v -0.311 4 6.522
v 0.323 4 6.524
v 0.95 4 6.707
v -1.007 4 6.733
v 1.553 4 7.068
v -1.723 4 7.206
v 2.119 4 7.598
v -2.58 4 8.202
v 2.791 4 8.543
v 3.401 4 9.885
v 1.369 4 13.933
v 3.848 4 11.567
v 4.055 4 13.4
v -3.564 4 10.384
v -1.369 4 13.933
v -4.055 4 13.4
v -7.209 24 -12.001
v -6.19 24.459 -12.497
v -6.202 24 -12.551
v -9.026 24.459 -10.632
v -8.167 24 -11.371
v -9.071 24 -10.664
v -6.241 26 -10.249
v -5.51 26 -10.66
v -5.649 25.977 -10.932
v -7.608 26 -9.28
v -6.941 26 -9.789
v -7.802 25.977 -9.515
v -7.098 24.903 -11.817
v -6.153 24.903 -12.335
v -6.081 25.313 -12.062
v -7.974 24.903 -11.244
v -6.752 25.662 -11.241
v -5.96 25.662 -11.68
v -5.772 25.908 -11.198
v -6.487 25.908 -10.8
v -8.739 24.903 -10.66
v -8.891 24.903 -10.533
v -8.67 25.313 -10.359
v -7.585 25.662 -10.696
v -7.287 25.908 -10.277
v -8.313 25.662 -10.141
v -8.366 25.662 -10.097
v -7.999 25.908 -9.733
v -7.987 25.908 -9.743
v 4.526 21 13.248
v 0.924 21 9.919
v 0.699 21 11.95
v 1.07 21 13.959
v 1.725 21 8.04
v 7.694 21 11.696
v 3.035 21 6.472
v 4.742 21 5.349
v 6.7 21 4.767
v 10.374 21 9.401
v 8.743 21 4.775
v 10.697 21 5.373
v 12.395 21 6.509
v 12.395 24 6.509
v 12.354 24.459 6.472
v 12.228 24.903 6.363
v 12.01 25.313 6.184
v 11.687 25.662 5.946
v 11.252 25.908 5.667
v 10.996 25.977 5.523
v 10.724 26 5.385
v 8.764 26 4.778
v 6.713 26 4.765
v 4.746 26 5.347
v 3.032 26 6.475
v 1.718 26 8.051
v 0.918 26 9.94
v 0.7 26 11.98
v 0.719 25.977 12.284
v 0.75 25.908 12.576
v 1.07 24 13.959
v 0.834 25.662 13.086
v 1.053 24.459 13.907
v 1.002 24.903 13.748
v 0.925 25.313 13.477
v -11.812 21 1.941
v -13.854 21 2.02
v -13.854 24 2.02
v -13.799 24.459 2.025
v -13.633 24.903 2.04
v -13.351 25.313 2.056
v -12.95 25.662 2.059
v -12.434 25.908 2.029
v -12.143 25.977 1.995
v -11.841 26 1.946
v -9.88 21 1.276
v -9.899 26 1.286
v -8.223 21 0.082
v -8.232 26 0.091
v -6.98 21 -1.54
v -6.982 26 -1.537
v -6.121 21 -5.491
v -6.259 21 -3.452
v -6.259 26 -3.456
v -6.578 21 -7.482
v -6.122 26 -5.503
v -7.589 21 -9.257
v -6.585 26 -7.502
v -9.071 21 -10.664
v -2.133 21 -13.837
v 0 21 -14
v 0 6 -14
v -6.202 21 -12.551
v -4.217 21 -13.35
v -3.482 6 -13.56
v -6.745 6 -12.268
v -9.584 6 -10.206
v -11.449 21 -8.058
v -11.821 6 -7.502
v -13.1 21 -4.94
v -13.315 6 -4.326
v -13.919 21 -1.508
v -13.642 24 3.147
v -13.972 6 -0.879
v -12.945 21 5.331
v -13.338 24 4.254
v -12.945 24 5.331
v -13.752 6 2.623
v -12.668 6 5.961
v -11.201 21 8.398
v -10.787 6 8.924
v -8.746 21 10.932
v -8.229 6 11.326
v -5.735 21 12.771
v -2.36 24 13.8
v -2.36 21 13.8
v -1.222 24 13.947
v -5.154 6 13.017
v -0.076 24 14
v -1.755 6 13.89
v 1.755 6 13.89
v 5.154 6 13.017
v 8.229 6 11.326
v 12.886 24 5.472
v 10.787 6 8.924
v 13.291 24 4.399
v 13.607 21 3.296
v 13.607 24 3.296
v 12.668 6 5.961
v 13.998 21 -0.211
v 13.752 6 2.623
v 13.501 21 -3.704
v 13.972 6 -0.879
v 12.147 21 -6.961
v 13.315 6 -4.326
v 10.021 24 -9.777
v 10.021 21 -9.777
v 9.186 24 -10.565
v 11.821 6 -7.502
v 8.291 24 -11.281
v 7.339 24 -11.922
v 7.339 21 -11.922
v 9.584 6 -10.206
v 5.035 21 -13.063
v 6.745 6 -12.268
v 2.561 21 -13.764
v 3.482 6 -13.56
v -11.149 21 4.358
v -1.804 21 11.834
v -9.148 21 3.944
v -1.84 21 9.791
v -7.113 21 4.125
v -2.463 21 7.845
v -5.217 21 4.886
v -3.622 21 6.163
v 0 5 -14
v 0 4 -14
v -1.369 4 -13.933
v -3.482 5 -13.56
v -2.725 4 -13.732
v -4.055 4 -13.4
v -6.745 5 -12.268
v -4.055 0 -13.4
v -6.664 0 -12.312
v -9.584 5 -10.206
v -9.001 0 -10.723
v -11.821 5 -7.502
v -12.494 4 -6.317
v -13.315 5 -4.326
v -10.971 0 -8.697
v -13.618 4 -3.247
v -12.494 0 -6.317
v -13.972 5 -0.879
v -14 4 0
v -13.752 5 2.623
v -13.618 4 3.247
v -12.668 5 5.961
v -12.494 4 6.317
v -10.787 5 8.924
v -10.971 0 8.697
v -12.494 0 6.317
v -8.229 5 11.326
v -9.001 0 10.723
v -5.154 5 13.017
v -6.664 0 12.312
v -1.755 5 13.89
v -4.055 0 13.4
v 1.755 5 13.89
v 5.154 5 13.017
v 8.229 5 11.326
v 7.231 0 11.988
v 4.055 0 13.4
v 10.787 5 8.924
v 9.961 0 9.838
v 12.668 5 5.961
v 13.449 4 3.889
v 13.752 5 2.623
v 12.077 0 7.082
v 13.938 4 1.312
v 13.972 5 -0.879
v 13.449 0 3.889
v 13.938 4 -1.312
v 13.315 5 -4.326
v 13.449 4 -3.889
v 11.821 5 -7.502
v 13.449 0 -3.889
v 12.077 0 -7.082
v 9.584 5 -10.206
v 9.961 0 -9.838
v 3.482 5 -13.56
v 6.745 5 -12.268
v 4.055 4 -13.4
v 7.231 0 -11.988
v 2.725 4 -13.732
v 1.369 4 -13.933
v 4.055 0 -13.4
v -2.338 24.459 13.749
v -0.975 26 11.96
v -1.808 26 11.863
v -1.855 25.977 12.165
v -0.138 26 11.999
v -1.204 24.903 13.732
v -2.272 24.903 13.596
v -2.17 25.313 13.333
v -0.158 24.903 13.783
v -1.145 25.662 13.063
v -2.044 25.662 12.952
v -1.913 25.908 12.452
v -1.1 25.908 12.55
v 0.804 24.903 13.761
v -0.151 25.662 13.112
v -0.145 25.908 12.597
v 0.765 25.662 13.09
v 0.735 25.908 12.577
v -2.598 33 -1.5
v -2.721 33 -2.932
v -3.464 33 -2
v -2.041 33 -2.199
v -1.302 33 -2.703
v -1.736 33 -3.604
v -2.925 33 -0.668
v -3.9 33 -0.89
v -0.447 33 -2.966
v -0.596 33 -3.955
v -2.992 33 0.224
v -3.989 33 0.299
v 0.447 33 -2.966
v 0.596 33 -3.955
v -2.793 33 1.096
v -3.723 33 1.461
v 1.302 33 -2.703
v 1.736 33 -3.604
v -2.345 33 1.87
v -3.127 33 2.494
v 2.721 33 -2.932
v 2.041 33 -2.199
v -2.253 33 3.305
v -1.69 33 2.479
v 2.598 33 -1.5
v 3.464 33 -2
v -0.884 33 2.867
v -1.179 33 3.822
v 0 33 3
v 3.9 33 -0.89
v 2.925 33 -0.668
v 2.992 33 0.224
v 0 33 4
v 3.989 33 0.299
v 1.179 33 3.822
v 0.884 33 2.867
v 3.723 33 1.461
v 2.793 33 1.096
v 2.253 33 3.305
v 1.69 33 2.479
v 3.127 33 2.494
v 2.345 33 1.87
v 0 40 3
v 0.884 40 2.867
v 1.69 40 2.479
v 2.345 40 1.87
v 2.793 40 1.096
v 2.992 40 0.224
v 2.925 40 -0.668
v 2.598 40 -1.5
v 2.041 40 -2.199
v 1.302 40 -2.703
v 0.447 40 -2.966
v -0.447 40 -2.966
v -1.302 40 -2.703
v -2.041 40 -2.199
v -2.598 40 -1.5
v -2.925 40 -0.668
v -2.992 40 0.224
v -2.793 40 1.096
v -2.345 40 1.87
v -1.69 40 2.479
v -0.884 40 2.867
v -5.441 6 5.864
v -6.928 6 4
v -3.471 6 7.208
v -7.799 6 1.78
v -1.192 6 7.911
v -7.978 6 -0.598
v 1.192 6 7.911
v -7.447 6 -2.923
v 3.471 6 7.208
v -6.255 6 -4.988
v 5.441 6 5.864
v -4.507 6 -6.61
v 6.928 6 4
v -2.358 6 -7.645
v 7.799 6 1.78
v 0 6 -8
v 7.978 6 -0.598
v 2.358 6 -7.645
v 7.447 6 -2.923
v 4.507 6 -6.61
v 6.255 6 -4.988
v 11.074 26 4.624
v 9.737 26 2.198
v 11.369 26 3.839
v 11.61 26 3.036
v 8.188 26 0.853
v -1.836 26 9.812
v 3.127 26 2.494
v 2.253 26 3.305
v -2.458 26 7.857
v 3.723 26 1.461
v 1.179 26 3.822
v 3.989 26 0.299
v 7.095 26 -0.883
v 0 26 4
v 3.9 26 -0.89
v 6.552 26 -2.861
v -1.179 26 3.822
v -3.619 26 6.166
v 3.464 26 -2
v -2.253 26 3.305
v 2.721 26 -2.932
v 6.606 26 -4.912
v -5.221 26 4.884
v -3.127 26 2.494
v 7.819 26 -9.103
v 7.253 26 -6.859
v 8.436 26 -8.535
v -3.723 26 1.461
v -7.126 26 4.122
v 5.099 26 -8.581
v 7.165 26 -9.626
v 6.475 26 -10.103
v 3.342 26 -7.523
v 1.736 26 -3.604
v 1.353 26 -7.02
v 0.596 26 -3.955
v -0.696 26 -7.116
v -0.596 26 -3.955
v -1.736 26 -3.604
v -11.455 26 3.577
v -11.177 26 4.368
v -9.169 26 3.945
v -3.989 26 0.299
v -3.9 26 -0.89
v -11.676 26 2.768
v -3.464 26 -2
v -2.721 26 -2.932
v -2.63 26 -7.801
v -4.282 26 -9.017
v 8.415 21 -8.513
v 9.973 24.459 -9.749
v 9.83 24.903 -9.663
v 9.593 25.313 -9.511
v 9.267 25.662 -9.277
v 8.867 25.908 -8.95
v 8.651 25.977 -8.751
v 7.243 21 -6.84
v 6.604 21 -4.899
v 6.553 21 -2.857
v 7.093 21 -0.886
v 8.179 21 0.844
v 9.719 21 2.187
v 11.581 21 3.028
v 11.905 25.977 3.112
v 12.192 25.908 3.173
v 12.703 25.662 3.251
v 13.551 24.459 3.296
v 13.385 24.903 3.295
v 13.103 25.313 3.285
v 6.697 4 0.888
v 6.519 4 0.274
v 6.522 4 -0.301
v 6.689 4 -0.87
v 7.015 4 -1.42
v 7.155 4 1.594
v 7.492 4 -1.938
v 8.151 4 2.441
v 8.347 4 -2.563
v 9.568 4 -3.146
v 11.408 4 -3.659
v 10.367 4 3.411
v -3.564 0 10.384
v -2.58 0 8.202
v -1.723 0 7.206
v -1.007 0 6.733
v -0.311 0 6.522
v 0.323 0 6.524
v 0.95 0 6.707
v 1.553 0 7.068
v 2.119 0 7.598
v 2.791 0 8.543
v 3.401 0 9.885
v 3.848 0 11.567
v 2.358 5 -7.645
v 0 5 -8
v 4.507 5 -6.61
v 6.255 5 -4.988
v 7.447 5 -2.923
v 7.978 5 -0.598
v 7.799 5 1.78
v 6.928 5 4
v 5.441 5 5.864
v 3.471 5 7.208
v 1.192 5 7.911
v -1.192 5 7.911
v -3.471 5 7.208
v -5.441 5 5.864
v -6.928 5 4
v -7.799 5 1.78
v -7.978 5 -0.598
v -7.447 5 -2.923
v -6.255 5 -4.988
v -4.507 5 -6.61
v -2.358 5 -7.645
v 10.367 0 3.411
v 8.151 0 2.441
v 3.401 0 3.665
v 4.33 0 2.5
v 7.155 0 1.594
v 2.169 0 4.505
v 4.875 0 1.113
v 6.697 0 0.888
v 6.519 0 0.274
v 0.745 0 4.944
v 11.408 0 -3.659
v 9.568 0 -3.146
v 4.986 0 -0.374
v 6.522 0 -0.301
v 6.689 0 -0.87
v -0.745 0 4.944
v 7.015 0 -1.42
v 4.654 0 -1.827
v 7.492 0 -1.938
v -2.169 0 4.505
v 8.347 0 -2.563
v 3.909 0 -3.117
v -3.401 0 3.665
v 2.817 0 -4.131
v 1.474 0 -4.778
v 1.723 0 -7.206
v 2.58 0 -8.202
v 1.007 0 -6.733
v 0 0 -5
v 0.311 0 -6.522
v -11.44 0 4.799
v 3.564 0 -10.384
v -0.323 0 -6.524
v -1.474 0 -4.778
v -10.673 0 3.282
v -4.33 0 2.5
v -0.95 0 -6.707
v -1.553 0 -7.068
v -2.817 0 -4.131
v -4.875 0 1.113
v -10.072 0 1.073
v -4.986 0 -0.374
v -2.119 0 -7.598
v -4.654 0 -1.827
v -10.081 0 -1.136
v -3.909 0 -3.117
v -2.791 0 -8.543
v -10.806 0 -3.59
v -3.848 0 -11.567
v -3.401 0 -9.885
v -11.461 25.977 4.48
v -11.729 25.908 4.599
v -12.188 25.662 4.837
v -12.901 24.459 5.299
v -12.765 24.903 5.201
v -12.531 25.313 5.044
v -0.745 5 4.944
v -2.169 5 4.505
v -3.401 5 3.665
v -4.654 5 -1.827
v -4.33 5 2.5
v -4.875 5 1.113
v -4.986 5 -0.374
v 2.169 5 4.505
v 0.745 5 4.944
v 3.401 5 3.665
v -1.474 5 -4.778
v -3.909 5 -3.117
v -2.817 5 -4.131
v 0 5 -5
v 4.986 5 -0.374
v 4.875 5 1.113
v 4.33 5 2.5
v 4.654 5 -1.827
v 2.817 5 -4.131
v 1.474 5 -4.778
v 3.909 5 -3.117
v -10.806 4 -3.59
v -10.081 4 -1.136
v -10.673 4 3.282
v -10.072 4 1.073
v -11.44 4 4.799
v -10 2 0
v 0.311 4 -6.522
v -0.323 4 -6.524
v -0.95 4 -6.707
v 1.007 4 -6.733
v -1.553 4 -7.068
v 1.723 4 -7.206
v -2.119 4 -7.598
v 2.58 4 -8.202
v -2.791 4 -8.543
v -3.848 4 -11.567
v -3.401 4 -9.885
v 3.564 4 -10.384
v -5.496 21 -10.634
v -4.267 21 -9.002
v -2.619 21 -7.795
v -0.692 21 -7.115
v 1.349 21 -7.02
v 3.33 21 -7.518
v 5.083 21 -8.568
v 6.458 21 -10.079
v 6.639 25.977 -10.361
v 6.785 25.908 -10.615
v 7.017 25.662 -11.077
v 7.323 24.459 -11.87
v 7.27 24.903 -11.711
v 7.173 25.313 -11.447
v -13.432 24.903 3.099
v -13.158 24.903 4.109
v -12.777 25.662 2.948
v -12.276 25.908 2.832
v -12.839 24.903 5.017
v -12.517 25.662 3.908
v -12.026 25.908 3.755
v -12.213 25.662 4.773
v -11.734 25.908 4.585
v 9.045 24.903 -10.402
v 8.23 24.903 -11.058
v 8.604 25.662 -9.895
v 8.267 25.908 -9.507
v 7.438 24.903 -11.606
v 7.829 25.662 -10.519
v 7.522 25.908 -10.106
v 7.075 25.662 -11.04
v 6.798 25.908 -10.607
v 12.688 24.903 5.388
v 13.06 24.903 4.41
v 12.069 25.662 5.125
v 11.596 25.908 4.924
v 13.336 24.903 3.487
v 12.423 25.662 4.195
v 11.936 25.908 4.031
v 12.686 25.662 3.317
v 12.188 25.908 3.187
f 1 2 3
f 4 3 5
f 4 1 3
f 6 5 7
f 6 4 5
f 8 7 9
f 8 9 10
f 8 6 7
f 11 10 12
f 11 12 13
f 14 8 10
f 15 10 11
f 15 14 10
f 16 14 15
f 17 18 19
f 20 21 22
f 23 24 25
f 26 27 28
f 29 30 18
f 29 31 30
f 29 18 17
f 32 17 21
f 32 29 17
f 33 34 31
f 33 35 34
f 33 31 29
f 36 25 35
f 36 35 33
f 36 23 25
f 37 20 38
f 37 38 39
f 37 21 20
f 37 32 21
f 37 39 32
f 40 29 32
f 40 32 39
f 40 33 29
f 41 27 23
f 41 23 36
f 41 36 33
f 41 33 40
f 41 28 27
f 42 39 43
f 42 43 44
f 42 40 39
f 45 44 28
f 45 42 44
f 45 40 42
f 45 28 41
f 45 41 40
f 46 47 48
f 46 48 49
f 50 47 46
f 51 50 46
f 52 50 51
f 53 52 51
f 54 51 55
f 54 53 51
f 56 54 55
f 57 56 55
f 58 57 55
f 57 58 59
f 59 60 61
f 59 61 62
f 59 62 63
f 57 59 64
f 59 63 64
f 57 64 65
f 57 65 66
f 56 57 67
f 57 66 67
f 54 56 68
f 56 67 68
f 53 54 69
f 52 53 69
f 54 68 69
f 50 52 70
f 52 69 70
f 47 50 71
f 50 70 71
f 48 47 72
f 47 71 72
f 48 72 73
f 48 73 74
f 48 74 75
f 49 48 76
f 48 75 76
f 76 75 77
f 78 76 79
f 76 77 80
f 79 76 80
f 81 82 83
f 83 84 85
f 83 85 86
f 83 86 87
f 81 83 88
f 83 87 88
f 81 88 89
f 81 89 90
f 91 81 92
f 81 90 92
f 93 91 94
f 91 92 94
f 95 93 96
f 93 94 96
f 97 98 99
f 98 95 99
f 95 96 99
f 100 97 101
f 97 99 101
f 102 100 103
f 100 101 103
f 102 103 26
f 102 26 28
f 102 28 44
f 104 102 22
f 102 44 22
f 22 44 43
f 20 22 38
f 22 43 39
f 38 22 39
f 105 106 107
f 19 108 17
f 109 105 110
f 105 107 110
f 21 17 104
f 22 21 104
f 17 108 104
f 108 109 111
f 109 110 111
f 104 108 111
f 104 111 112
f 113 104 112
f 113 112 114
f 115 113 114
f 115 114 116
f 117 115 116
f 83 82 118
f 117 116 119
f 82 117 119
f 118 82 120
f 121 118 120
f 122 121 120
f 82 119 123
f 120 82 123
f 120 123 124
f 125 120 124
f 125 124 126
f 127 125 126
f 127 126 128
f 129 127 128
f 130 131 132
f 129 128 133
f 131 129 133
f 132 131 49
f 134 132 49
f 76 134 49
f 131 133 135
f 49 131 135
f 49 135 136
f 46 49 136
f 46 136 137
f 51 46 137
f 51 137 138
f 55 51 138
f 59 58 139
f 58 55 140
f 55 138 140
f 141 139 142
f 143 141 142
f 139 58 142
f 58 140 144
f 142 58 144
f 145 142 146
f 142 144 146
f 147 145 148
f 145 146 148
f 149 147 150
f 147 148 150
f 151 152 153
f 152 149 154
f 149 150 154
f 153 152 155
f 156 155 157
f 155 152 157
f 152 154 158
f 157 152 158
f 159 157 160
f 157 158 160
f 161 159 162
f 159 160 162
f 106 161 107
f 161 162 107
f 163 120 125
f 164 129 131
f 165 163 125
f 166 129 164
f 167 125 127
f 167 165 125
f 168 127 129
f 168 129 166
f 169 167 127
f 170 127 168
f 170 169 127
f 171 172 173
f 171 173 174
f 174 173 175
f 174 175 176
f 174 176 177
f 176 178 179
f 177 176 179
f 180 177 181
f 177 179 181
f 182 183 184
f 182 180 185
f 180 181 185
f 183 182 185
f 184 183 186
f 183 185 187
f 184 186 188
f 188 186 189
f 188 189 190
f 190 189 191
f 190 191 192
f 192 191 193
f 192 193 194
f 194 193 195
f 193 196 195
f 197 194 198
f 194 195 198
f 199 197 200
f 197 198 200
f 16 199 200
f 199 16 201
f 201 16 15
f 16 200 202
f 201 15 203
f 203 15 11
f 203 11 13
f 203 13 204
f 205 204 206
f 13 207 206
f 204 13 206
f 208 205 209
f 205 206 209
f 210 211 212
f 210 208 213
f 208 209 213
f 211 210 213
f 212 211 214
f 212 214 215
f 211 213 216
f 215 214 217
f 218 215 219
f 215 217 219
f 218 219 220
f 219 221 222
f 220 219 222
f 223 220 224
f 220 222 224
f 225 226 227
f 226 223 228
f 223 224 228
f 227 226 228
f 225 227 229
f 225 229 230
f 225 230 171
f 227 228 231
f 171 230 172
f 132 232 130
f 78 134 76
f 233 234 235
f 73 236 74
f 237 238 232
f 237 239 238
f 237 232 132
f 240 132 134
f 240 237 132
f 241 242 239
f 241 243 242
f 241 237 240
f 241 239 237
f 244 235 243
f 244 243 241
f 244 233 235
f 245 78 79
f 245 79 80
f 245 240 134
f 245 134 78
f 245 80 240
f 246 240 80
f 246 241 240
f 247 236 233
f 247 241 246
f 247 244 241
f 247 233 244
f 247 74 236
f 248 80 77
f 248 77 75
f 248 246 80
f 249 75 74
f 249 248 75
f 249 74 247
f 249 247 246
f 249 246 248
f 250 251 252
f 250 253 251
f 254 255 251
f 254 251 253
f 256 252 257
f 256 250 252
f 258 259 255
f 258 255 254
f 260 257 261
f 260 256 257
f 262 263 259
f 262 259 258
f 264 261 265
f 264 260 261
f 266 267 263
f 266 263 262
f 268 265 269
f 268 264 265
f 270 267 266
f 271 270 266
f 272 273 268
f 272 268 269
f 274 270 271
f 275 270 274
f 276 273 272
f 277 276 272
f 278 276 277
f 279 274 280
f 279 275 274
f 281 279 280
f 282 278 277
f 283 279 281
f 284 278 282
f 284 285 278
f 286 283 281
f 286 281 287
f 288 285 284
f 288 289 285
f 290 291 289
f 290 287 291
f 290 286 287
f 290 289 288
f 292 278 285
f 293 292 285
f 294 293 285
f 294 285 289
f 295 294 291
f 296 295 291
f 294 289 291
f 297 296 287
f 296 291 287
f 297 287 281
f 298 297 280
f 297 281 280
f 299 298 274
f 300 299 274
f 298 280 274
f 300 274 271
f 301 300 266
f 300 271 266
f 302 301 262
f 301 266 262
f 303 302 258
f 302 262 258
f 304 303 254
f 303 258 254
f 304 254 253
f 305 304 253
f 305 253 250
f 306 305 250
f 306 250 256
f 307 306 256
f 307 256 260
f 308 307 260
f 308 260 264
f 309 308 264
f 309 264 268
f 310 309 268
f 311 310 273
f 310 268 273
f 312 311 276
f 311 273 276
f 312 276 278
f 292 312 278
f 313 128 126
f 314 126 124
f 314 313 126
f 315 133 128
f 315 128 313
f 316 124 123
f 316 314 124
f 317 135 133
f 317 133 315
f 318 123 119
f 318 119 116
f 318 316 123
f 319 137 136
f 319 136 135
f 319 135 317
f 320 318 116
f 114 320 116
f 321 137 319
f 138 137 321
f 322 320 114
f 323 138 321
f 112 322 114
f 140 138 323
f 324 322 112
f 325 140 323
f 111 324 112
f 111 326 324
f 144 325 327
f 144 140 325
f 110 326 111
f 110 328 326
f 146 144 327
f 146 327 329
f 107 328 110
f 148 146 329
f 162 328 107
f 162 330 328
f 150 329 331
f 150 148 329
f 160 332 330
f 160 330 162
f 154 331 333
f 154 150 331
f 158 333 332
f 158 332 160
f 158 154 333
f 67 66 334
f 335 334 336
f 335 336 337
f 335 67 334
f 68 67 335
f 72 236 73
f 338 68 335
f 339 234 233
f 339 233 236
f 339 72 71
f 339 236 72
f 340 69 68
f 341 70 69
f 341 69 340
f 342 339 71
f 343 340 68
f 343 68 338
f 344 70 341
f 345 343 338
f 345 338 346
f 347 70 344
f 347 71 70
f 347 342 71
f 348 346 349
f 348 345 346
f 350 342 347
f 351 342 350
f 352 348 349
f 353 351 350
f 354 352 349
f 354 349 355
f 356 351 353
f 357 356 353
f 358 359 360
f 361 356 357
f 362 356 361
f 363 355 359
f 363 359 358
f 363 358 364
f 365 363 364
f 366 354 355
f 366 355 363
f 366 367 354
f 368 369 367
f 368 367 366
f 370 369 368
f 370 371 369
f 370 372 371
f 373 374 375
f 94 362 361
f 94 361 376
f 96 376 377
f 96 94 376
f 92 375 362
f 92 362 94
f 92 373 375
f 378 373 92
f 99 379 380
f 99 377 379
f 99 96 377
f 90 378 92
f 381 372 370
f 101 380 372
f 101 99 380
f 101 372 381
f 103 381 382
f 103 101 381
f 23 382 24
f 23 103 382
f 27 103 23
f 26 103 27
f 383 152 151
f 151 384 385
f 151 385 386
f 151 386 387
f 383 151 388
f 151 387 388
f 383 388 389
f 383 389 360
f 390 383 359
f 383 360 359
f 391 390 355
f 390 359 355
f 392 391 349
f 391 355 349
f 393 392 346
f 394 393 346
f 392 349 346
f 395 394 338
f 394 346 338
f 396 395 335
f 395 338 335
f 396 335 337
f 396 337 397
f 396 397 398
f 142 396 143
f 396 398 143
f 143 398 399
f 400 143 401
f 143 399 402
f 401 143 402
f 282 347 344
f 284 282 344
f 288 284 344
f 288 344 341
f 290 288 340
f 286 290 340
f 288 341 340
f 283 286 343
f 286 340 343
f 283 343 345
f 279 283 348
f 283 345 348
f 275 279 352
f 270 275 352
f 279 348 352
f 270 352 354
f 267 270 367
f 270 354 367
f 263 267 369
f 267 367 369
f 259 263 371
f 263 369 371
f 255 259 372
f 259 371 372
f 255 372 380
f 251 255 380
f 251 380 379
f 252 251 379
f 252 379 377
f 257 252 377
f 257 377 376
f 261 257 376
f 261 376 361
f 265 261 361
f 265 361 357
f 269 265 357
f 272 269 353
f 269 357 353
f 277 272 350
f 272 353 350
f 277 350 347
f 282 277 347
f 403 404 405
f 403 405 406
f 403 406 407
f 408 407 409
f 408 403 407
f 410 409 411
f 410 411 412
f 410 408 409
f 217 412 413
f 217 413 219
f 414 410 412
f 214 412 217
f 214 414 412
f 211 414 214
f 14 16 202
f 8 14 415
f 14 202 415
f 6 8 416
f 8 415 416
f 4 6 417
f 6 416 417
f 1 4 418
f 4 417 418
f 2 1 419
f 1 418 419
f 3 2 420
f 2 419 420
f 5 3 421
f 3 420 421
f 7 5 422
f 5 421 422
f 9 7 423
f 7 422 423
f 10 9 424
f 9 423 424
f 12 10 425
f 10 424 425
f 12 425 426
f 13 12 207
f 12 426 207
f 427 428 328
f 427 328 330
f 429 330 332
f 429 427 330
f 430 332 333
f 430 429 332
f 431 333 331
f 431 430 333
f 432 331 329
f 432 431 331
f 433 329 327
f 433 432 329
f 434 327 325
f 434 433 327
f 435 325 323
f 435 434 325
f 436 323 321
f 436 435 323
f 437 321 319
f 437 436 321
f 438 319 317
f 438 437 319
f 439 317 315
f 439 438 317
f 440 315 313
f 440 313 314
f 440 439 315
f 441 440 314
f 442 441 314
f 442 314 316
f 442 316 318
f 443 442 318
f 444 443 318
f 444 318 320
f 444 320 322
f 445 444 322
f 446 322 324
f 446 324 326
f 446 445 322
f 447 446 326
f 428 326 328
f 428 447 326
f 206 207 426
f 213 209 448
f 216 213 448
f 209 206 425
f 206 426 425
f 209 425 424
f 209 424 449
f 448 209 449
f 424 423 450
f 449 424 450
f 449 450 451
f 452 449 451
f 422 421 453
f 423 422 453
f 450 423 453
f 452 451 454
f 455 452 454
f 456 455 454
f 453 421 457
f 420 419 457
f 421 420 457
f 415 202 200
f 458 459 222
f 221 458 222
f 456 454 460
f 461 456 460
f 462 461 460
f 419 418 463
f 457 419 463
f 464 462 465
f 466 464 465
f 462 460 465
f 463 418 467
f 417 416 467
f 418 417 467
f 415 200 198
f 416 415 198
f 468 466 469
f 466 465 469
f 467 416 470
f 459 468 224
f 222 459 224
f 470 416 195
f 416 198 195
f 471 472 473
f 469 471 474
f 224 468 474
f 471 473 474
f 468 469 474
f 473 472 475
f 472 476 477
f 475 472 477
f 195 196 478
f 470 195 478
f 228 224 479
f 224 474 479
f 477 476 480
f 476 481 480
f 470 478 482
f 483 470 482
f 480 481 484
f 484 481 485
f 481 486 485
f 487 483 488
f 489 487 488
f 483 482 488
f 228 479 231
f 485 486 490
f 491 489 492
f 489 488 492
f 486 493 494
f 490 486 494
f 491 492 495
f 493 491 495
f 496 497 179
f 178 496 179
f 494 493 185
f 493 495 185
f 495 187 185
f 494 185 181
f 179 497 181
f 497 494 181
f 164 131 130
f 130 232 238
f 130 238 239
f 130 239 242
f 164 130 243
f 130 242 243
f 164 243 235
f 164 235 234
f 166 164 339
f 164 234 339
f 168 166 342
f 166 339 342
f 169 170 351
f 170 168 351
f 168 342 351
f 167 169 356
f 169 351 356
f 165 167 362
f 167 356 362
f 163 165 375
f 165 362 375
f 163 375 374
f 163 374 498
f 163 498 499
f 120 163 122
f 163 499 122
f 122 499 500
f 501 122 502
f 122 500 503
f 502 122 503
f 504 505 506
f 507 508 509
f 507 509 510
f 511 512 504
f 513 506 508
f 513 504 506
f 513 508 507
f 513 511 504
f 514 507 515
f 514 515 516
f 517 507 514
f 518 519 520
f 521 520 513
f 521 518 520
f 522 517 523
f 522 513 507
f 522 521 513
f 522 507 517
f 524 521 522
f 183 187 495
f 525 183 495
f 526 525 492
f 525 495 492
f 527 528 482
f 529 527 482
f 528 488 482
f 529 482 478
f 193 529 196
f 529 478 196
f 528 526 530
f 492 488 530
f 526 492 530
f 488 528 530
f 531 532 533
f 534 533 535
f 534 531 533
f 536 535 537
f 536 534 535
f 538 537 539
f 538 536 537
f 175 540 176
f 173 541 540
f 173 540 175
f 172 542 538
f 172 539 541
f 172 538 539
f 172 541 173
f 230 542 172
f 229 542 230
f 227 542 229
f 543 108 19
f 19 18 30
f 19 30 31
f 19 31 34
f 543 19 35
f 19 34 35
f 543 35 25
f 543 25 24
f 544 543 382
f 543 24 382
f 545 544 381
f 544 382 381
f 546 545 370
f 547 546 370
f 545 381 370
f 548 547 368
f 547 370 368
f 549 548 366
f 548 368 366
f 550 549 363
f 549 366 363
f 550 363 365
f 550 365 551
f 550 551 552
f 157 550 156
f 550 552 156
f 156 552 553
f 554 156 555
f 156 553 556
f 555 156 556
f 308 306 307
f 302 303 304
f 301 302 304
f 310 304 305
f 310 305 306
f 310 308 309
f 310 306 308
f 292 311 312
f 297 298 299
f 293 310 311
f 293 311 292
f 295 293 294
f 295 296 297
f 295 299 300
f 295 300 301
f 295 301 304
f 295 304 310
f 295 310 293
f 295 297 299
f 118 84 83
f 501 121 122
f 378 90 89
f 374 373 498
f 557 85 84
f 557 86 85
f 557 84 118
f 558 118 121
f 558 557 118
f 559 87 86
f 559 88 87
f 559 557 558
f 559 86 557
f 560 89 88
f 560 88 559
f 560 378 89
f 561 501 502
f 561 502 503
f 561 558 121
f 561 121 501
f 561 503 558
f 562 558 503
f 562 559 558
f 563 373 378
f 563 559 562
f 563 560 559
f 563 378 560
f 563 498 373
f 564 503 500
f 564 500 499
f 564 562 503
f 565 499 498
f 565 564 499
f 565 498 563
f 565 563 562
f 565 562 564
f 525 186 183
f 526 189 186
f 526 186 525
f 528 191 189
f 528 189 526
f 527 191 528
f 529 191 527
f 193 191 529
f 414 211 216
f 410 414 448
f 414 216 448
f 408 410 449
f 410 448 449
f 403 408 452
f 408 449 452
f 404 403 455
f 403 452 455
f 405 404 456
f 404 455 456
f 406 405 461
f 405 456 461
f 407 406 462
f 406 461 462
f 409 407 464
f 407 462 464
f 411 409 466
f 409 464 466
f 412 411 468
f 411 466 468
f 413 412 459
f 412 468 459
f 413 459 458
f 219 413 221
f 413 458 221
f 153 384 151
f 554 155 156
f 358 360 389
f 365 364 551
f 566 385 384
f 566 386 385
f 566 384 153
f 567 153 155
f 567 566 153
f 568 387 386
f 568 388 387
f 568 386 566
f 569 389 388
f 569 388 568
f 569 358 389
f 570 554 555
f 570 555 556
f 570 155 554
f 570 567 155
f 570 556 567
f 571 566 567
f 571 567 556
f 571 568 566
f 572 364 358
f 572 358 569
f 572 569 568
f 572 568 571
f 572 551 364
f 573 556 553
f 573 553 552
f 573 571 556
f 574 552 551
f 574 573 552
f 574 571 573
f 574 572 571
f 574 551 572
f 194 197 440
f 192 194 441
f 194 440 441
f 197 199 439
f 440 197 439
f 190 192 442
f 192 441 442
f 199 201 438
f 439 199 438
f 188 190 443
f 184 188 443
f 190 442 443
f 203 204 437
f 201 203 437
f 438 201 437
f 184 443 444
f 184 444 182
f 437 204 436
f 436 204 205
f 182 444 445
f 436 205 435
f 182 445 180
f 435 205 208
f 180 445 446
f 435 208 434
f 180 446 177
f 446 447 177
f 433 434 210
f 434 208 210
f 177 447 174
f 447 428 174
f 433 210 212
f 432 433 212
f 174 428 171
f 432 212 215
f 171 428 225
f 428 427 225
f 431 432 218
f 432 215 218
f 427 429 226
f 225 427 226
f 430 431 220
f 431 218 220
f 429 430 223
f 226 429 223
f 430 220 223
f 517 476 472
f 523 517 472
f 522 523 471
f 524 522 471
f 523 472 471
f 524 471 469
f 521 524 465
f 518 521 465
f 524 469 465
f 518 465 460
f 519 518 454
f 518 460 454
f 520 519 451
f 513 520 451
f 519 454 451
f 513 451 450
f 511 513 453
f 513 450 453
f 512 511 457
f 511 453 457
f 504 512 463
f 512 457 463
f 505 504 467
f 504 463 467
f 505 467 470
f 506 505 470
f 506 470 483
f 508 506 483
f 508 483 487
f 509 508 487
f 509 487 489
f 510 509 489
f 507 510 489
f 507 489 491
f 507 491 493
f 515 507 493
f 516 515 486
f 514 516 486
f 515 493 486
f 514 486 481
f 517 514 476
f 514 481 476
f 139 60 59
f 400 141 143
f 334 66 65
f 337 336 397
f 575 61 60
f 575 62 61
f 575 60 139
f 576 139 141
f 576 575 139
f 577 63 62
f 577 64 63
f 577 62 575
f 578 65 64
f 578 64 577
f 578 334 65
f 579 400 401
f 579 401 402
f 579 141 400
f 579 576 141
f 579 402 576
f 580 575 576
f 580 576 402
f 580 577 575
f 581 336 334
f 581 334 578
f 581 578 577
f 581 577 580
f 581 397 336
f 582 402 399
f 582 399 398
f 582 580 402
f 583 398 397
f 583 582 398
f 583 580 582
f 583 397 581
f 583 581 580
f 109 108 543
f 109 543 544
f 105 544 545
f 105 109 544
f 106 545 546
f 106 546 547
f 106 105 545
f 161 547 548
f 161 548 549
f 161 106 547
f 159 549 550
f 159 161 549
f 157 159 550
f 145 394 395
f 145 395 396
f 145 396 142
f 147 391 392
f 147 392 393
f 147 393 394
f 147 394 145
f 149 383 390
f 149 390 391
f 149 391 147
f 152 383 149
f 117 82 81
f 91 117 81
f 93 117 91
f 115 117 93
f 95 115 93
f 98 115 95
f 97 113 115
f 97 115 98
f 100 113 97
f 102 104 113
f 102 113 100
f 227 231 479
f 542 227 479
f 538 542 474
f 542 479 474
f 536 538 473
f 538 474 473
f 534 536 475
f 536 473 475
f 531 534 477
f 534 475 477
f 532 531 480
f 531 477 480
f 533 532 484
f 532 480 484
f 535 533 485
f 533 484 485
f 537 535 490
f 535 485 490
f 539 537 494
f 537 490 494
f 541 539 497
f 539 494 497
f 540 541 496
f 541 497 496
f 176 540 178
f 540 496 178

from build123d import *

# Parameters (mm, degrees)
SKETCH1_R           = 14
BOSS_EXTRUDE1_DEPTH = 26
SKETCH2_R           = 4
BOSS_EXTRUDE2_DEPTH = 7
SKETCH3_R           = 3
BOSS_EXTRUDE3_DEPTH = 7
SKETCH5_R           = 5
CUT_EXTRUDE1_DEPTH  = 5
SKETCH7_R           = 7
CUT_EXTRUDE2_DEPTH  = 5
FILLET1_R           = 2
SKETCH9_RX          = 7.5
SKETCH9_RY          = 4.068391424
SKETCH9_RY_2        = 3.899393896
CUT_EXTRUDE3_DEPTH  = 4
SKETCH11_R          = 14
SKETCH11_R_2        = 8
CUT_EXTRUDE4_DEPTH  = 1


with BuildPart() as part:
    # Sketch1 → Boss-Extrude1 (new body)
    with BuildSketch(Plane(origin=(0, 0, 0), x_dir=(1, 0, 0), z_dir=(0, 1, 0))):
        with Locations(Location((0, 0, 0), (0, 0, 90))):
            Circle(SKETCH1_R)
    extrude(amount=BOSS_EXTRUDE1_DEPTH)

    # Sketch2 → Boss-Extrude2 (add)
    with BuildSketch(Plane(origin=(0, 26, 0), x_dir=(1, 0, 0), z_dir=(0, 1, 0))):
        with Locations(Location((0, 0, 0), (0, 0, 270))):
            Circle(SKETCH2_R)
    extrude(amount=BOSS_EXTRUDE2_DEPTH)

    # Sketch3 → Boss-Extrude3 (add)
    with BuildSketch(Plane(origin=(0, 33, 0), x_dir=(1, 0, 0), z_dir=(0, 1, 0))):
        with Locations(Location((0, 0, 0), (0, 0, 270))):
            Circle(SKETCH3_R)
    extrude(amount=BOSS_EXTRUDE3_DEPTH)

    # Sketch5 → Cut-Extrude1 (cut)
    with BuildSketch(Plane.XZ):
        with Locations(Location((0, 0, 0), (0, 0, 270))):
            Circle(SKETCH5_R)
    extrude(amount=-CUT_EXTRUDE1_DEPTH, mode=Mode.SUBTRACT)

    # Sketch7 → Cut-Extrude2 (cut)
    with BuildSketch(Plane(origin=(0, 26, 0), x_dir=(1, 0, 0), z_dir=(0, 1, 0))):
        with Locations((-13.099617669, 4.939637327)):
            Circle(SKETCH7_R)
        with Locations((-8.745866262, -10.932054854)):
            Circle(SKETCH7_R)
        with Locations((7.694394058, -11.695995045)):
            Circle(SKETCH7_R)
        with Locations((13.501246597, 3.703557793)):
            Circle(SKETCH7_R)
        with Locations((0.649805899, 13.984911594)):
            Circle(SKETCH7_R)
    extrude(amount=-CUT_EXTRUDE2_DEPTH, mode=Mode.SUBTRACT)

    # Fillet1
    fillet1_edges = [part.edges().sort_by_distance(p)[0] for p in [
        (-13.501257172, 26, 3.703519243),
        (-0.64984583, 26, 13.984909739),
        (13.099631773, 26, 4.939599924),
        (8.745835048, 26, -10.932079826),
        (-7.694394058, 26, -11.695995045),
    ]]
    fillet(fillet1_edges, radius=FILLET1_R)

    # Sketch9 → Cut-Extrude3 (cut)
    with BuildSketch(Plane.XZ):
        with Locations(Location((0, -14), (0, 0, -90))):
            Ellipse(SKETCH9_RX, SKETCH9_RY)
        with Locations(Location((14, 0), (0, 0, 0))):
            Ellipse(SKETCH9_RX, SKETCH9_RY_2)
        with Locations(Location((0, 14), (0, 0, 90))):
            Ellipse(SKETCH9_RX, SKETCH9_RY)
        with BuildLine():
            ThreePointArc((-12.493901532, 6.31683659), (-14, 0), (-12.493901532, -6.31683659))
            add(Edge.make_bspline(
                [(-12.493901532, -6.31683659), (-7.506098468, 0), (-12.493901532, 6.31683659)],
                knots=[0, 0, 0, 1, 1, 1], degree=2))
        make_face()
    extrude(amount=-CUT_EXTRUDE3_DEPTH, mode=Mode.SUBTRACT)

    # Sketch11 → Cut-Extrude4 (cut)
    with BuildSketch(Plane(origin=(0, 5, 0), x_dir=(-1, 0, 0), z_dir=(0, -1, 0))):
        with Locations(Location((0, 0, 0), (0, 0, 90))):
            Circle(SKETCH11_R)
        with Locations(Location((0, 0, 0), (0, 0, 90))):
            Circle(SKETCH11_R_2, mode=Mode.SUBTRACT)
    extrude(amount=-CUT_EXTRUDE4_DEPTH, mode=Mode.SUBTRACT)


solid = part.part
